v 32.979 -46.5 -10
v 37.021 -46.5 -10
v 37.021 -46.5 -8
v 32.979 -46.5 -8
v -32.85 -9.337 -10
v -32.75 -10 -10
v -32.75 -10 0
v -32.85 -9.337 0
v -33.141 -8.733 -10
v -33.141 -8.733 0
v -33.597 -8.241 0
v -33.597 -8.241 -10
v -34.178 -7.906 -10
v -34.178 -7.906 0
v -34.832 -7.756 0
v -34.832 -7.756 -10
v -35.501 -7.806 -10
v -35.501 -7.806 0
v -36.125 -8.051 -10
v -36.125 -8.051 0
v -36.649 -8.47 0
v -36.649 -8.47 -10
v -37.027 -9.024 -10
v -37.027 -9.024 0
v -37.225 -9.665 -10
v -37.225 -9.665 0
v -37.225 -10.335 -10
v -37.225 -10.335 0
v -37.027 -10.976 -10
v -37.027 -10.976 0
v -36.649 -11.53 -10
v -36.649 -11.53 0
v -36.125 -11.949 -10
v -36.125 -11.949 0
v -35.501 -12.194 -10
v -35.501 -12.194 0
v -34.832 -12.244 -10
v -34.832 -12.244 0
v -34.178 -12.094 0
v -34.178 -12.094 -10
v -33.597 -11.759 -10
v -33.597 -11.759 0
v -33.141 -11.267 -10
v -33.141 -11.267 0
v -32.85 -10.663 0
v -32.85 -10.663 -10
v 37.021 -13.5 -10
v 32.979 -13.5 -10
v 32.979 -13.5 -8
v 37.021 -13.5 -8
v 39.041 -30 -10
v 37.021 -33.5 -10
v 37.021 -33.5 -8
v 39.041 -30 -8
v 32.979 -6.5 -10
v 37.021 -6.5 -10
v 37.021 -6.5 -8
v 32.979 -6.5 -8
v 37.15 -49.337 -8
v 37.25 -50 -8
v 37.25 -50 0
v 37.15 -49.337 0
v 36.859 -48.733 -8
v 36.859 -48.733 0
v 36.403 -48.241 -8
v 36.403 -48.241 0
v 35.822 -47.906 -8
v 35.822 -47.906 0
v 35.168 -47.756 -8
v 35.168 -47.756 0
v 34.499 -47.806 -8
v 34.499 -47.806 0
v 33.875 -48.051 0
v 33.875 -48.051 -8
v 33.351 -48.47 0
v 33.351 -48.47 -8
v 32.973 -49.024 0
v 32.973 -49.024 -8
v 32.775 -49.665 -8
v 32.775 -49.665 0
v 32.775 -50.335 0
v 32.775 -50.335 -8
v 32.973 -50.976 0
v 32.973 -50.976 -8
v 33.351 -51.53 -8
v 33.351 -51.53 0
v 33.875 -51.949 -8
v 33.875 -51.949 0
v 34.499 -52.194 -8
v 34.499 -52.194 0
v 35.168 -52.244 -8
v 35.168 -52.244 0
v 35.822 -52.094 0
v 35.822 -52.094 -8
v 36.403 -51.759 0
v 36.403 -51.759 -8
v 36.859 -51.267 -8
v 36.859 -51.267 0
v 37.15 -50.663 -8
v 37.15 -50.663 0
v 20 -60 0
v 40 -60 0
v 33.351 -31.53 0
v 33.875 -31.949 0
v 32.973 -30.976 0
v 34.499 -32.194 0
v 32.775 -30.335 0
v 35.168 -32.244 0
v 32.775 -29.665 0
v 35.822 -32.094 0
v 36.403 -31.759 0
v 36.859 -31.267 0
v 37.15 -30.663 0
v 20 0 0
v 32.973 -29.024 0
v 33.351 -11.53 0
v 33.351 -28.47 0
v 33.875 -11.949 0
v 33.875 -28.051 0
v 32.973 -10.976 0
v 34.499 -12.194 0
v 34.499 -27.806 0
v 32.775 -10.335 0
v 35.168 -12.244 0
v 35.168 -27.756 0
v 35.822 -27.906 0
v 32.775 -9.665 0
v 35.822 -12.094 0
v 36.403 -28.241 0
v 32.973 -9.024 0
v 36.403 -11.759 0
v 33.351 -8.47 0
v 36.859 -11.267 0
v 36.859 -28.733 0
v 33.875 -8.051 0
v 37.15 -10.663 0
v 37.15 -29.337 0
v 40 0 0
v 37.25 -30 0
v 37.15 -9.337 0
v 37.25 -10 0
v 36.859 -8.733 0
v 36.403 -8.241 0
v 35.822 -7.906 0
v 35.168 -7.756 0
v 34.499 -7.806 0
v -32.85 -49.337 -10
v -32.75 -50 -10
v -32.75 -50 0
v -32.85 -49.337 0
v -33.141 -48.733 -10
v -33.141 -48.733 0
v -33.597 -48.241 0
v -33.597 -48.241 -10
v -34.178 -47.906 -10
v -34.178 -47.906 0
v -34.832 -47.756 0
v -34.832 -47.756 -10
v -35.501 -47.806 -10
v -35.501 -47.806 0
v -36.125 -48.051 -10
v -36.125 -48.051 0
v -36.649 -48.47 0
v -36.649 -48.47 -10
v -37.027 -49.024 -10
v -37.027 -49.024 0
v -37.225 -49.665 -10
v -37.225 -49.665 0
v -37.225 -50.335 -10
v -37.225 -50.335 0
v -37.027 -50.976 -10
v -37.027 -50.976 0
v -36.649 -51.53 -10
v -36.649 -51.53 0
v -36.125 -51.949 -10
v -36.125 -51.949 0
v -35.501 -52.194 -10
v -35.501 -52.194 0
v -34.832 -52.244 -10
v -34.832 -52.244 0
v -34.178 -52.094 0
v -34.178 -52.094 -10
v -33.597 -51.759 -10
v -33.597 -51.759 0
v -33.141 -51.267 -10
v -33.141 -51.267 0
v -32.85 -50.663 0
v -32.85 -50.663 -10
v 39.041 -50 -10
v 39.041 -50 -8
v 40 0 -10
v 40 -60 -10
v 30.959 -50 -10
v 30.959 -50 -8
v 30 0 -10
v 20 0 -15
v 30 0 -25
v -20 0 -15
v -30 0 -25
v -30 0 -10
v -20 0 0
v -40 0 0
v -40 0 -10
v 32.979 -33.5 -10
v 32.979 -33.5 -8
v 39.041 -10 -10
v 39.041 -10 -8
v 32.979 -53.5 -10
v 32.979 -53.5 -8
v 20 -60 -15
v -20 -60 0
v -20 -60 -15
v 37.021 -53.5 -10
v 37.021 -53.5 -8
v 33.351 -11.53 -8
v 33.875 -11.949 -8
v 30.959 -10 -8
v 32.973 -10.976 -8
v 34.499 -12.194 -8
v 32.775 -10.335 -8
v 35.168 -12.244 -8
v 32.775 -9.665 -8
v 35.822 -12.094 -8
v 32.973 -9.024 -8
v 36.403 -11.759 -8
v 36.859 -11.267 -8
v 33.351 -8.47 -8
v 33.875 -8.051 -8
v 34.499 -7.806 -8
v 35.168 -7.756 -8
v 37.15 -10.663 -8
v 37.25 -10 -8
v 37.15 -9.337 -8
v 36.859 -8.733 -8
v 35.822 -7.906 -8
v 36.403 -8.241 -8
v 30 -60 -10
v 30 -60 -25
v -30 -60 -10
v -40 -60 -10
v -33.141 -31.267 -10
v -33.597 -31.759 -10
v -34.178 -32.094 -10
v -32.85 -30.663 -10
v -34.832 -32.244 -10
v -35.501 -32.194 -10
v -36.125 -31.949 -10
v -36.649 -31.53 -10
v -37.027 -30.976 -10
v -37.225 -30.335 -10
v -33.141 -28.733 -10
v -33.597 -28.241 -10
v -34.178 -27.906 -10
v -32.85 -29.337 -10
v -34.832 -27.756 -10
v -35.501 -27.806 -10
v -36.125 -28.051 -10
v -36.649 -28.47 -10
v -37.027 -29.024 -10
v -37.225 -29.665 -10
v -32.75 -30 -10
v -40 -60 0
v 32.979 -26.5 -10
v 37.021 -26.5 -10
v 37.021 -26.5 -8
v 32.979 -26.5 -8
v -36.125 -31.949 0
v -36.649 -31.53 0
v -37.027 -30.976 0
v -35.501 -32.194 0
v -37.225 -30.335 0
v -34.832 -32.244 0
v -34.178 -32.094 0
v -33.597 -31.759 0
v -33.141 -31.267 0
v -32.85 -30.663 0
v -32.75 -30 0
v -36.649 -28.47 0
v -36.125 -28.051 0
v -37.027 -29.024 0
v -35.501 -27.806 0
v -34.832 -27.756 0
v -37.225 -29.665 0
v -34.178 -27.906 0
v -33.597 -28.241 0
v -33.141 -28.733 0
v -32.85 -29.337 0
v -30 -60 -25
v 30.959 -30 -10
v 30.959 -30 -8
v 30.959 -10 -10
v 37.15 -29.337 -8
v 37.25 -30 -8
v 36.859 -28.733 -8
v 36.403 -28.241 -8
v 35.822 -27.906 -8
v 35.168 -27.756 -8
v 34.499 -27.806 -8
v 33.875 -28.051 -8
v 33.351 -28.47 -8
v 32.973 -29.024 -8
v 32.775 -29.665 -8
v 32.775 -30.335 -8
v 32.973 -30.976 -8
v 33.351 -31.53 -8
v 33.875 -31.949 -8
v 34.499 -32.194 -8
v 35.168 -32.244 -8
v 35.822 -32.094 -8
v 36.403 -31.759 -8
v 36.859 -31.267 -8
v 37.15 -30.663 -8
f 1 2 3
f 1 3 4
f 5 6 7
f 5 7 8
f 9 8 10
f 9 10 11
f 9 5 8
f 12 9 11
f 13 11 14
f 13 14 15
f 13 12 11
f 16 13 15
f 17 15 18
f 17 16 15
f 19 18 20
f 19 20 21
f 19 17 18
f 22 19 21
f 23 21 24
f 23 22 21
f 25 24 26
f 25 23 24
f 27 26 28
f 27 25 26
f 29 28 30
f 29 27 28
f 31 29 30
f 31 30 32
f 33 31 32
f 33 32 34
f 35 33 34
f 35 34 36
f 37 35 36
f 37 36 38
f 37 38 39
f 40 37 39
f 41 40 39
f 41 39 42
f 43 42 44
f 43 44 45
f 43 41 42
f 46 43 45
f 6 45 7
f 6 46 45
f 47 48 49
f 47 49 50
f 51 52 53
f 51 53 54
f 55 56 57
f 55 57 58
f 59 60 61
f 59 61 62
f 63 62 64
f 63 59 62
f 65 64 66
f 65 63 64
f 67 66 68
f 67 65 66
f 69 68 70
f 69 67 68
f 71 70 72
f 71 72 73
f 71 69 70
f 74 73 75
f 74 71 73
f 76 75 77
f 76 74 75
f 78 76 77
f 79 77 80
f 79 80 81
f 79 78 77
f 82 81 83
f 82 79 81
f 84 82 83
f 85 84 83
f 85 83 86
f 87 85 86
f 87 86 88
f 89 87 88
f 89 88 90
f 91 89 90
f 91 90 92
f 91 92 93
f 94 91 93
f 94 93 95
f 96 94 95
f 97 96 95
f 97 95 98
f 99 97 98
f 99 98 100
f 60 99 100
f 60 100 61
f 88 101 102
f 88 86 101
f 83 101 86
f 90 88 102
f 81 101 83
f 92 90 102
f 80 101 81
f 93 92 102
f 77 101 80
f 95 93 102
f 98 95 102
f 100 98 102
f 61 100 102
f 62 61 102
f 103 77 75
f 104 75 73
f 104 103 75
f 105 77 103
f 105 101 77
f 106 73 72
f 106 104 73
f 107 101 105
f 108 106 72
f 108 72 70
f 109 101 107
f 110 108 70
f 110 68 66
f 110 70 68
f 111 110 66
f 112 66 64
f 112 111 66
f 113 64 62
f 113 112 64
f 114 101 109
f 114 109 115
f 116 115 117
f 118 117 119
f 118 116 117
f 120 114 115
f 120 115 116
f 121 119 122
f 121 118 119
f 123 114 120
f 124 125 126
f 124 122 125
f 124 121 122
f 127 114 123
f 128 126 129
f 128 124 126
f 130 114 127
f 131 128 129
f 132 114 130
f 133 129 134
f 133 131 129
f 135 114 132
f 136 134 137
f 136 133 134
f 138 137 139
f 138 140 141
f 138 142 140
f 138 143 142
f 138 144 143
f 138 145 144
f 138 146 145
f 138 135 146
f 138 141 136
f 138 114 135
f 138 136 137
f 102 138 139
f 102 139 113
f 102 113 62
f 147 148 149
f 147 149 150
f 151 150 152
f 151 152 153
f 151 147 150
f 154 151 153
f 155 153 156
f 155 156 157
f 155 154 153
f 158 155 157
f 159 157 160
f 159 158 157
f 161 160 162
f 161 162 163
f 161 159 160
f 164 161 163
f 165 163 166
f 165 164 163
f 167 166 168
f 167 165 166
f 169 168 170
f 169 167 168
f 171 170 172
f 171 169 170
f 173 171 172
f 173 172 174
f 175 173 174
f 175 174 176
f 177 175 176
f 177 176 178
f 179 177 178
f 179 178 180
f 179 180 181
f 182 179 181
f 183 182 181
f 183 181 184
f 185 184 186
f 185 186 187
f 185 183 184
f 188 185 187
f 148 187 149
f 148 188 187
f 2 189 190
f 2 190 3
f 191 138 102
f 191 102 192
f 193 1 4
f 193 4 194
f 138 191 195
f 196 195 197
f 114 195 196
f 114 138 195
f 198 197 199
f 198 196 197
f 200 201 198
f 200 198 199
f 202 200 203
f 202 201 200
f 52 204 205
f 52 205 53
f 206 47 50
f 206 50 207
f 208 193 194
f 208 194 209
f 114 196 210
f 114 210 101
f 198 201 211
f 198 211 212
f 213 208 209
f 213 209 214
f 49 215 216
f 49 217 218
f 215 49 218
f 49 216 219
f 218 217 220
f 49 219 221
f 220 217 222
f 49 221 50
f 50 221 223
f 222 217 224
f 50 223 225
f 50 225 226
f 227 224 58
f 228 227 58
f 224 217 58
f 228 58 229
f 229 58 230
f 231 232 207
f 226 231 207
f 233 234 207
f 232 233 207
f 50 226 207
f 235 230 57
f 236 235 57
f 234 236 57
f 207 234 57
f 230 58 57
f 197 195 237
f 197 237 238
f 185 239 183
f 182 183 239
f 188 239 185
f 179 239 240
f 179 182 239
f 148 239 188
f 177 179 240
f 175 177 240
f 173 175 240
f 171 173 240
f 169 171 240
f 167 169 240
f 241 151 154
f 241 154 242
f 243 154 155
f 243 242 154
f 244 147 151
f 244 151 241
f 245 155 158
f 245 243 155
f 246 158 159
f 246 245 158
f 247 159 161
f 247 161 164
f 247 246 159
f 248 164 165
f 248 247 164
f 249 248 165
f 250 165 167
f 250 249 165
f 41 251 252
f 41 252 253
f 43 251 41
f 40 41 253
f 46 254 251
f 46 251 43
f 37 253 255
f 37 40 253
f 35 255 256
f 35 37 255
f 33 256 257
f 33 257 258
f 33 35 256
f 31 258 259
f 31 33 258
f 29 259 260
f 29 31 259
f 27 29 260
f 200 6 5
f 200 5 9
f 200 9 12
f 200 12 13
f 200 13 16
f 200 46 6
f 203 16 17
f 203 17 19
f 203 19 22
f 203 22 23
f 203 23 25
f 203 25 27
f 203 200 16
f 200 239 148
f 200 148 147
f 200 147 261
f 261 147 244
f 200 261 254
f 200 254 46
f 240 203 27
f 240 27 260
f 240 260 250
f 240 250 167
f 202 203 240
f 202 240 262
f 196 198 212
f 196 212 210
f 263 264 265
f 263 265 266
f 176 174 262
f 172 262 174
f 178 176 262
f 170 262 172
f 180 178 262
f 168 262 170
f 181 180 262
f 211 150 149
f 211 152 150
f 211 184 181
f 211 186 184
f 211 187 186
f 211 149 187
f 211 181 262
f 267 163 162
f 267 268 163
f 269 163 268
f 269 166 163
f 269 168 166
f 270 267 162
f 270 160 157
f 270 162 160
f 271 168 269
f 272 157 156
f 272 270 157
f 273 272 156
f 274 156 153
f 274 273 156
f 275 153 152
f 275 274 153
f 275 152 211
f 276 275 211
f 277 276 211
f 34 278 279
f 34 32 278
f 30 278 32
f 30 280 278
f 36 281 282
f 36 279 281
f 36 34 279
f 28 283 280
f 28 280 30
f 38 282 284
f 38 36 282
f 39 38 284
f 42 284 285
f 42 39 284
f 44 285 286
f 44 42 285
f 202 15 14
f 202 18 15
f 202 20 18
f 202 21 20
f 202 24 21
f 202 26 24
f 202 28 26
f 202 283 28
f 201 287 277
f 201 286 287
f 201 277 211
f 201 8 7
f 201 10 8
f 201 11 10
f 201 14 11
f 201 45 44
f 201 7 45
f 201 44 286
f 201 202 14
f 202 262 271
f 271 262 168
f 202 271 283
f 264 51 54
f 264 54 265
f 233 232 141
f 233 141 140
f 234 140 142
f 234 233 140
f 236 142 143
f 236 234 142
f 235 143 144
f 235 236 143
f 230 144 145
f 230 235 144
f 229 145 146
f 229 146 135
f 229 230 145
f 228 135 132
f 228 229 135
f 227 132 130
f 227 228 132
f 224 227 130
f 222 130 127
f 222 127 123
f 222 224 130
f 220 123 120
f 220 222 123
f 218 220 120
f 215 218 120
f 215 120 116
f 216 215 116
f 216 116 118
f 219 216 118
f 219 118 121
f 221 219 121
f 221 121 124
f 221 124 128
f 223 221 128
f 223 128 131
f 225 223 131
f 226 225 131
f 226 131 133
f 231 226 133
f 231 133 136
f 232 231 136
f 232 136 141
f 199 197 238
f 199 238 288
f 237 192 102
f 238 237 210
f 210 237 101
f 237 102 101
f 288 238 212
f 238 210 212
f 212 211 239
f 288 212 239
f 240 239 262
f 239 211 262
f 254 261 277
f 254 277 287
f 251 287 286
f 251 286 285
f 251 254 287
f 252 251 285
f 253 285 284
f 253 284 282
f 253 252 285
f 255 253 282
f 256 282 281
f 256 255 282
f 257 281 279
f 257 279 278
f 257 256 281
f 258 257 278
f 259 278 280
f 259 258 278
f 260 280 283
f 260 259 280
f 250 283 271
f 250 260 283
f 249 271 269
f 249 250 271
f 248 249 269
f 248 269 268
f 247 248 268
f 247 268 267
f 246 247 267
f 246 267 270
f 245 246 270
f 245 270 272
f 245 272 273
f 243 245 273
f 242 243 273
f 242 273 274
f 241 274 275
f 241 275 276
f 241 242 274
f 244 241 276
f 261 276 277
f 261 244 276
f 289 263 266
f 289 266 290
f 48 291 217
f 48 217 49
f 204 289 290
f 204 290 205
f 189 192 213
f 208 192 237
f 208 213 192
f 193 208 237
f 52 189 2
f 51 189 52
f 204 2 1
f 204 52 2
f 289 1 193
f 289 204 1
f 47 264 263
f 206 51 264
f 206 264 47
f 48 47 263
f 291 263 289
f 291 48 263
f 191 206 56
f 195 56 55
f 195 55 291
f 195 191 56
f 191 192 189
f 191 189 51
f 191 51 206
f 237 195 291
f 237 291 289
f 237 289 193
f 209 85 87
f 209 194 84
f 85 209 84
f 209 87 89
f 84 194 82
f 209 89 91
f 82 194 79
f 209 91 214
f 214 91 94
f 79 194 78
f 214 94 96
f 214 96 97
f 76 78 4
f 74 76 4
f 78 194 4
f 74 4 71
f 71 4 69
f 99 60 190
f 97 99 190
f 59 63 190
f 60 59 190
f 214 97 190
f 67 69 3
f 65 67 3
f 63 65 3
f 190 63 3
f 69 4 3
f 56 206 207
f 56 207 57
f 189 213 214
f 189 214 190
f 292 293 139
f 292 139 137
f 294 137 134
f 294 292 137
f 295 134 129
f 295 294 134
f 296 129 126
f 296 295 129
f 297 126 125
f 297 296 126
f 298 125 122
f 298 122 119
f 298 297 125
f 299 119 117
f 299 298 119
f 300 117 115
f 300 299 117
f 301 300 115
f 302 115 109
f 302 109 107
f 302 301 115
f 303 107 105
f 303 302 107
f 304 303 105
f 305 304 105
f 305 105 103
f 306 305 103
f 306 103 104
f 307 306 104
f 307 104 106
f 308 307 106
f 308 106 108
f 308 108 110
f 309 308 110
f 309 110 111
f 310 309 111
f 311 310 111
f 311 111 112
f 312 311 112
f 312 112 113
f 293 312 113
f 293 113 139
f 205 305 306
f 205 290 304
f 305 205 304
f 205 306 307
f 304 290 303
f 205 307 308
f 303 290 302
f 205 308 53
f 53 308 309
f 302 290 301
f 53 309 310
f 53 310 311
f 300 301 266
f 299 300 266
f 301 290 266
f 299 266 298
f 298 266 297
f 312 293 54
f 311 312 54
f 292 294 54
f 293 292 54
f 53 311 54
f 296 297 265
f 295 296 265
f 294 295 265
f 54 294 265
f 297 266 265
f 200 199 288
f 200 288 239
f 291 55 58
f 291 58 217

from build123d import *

# Parameters (mm, degrees)
PAD_DEPTH       = 60
SKETCH004_R     = 2.25
POCKET002_DEPTH = 10
POCKET_DEPTH    = 2


with BuildPart() as part:
    # Sketch → Pad (new body)
    with BuildSketch(Plane.XZ):
        Polygon((-40, 0), (-20, 0), (-20, -15), (20, -15), (20, 0), (40, 0), (40, -10), (30, -10), (30, -25), (-30, -25), (-30, -10), (-40, -10), align=None)
    extrude(amount=PAD_DEPTH)

    # Sketch004 (on DatumPlane) → Pocket002 (cut)
    with BuildSketch(Plane.XY.offset(-10)):
        with Locations((-35, -10)):
            Circle(SKETCH004_R)
        with Locations((35, -10)):
            Circle(SKETCH004_R)
        with Locations((-35, -30)):
            Circle(SKETCH004_R)
        with Locations((35, -30)):
            Circle(SKETCH004_R)
        with Locations((-35, -50)):
            Circle(SKETCH004_R)
        with Locations((-35, -70)):
            Circle(SKETCH004_R)
        with Locations((35, -50)):
            Circle(SKETCH004_R)
        with Locations((35, -70)):
            Circle(SKETCH004_R)
    extrude(amount=POCKET002_DEPTH, mode=Mode.SUBTRACT)

    # Sketch005 (on DatumPlane) → Pocket (cut)
    with BuildSketch(Plane.XY.offset(-10)):
        Polygon((39.041452, -10), (37.020726, -6.5), (32.979274, -6.5), (30.958548, -10), (32.979274, -13.5), (37.020726, -13.5), align=None)
        Polygon((39.041452, -30), (37.020726, -26.5), (32.979274, -26.5), (30.958548, -30), (32.979274, -33.5), (37.020726, -33.5), align=None)
        Polygon((39.041452, -50), (37.020726, -46.5), (32.979274, -46.5), (30.958548, -50), (32.979274, -53.5), (37.020726, -53.5), align=None)
        Polygon((39.041452, -70), (37.020726, -66.5), (32.979274, -66.5), (30.958548, -70), (32.979274, -73.5), (37.020726, -73.5), align=None)
    extrude(amount=POCKET_DEPTH, mode=Mode.SUBTRACT)


solid = part.part
